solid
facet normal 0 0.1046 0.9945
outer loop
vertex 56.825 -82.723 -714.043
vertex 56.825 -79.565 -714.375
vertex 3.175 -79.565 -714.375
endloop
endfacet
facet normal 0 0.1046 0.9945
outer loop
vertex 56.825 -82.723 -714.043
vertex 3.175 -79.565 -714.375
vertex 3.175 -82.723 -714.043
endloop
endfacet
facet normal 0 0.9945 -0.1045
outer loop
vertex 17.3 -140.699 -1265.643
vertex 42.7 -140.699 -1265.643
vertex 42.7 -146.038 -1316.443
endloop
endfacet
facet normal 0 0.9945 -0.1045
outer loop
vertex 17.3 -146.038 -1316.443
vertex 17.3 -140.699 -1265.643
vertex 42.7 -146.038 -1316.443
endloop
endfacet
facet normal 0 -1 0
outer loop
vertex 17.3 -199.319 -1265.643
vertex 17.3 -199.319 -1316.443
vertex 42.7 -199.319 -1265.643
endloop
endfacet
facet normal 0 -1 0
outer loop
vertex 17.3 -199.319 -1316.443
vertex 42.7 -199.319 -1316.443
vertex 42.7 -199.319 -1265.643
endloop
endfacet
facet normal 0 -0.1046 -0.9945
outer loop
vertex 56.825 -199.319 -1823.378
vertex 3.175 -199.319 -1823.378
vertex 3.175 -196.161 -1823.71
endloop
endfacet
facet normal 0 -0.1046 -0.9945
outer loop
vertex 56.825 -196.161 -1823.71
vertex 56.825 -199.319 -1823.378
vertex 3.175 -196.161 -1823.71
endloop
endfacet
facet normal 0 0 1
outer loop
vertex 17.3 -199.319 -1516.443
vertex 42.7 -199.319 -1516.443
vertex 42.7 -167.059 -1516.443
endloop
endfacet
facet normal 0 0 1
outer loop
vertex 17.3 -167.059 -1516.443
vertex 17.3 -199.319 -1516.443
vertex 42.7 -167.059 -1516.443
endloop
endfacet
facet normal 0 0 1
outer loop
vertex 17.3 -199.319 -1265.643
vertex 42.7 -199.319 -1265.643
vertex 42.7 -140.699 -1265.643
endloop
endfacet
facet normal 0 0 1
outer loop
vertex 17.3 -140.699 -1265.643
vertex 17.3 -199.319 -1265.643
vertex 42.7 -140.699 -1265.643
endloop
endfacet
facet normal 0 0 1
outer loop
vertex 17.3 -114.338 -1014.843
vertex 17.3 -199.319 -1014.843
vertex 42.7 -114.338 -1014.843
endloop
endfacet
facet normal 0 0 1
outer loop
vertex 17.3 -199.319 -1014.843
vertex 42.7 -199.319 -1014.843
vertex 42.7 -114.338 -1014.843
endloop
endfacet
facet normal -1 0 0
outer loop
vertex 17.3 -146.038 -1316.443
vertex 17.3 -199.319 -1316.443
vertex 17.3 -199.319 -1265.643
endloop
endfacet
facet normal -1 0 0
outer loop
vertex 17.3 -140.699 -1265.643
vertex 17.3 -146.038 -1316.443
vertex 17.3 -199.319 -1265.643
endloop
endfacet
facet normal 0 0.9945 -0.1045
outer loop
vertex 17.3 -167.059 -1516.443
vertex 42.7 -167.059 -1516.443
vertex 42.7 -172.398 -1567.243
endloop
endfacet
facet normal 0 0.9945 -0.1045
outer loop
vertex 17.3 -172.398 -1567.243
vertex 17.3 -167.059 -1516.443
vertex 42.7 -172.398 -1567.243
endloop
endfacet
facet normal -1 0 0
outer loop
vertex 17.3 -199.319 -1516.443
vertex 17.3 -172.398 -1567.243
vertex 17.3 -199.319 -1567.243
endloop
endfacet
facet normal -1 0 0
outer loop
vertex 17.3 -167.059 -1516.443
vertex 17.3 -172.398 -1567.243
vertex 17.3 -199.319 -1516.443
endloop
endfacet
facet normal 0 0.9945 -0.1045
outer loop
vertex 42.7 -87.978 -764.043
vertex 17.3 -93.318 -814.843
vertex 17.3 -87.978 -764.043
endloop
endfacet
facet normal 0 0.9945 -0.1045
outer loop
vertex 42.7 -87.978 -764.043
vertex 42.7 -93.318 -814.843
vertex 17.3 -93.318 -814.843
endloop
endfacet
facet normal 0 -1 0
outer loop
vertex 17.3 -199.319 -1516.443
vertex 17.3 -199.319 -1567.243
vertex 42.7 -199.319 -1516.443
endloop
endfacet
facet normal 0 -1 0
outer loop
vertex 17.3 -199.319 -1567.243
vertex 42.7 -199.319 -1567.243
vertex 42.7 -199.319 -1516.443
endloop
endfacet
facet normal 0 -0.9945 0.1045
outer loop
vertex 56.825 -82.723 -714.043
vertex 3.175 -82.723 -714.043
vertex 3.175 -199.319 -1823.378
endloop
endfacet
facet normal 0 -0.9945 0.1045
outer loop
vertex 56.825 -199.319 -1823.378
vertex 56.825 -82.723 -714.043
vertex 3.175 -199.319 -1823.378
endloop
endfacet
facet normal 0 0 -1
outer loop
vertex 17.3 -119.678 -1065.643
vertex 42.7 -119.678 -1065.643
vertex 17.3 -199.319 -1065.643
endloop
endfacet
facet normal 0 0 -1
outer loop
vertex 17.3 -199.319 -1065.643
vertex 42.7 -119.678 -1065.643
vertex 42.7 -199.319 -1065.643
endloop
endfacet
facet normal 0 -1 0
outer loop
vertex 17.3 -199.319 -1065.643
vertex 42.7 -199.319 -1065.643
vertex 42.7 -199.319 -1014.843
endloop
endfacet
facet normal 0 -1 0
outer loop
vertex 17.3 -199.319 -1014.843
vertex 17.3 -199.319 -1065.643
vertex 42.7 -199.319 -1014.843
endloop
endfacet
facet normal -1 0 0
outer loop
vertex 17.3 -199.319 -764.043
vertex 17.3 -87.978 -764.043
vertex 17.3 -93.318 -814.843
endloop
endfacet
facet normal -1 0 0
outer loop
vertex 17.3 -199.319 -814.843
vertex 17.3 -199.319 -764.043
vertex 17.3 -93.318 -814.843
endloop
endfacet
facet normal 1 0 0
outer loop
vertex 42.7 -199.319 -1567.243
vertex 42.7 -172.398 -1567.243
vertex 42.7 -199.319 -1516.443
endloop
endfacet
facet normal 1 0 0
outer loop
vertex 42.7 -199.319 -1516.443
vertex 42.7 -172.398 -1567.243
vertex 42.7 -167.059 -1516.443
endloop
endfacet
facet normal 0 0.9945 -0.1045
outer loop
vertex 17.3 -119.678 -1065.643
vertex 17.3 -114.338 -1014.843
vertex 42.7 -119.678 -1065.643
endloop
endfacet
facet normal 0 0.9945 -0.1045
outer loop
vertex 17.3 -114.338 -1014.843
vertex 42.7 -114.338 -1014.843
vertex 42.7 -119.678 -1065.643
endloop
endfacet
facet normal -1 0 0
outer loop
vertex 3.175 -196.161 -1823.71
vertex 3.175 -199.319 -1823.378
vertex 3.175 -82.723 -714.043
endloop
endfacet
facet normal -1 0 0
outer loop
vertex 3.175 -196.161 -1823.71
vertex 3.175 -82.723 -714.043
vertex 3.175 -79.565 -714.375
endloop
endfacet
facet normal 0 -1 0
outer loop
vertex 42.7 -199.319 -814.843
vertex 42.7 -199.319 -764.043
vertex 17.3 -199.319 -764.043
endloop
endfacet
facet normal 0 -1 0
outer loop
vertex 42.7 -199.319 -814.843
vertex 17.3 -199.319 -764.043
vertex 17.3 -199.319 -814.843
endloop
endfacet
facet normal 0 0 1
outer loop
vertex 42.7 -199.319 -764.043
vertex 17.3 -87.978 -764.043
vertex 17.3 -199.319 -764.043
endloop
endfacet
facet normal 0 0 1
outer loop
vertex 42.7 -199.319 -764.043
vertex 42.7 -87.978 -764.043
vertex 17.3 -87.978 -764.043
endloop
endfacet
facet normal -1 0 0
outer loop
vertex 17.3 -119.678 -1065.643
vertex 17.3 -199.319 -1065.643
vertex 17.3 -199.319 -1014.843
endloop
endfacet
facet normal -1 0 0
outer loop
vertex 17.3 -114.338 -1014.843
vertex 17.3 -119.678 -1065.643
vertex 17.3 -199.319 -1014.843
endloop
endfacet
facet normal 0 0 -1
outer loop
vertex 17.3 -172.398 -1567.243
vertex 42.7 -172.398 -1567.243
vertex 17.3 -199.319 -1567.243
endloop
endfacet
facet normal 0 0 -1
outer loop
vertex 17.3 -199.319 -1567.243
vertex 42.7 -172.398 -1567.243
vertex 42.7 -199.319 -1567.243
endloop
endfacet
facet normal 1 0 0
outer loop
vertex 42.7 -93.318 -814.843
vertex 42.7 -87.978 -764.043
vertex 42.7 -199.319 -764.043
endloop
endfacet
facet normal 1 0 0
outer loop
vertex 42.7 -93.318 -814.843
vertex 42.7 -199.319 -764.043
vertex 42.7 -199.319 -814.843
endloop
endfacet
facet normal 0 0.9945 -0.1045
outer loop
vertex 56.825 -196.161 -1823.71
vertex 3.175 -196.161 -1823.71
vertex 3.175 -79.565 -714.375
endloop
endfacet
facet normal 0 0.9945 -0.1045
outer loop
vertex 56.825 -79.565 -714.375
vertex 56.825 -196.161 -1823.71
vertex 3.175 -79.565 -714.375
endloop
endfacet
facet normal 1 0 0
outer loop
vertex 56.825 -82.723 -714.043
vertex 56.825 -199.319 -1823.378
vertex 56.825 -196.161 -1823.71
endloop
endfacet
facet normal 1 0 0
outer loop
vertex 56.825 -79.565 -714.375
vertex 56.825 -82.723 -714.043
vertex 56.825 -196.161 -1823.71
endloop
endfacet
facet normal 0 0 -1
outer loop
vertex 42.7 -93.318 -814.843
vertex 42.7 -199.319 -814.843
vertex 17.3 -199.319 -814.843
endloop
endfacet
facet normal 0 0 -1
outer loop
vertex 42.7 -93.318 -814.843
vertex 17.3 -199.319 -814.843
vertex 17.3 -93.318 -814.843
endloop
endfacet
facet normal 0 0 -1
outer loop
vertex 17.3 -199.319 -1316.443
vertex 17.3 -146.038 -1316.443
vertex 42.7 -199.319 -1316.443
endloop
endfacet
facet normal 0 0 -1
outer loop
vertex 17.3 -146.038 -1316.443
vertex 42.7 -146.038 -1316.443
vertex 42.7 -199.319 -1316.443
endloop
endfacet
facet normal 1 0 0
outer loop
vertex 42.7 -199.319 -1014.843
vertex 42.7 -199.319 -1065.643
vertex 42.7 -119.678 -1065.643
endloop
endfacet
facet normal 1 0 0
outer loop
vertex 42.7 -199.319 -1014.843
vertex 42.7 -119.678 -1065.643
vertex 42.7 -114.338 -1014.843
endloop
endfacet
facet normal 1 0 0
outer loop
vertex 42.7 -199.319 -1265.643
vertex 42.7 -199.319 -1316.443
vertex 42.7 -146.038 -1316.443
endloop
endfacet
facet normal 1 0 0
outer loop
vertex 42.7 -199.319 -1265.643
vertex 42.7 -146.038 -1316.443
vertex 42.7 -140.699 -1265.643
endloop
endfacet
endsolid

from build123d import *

# Parameters (mm, degrees)
SLOPE_THICKEN1_START  = 3.175
SLOPE_THICKEN1_DEPTH  = 53.65
BOSS_EXTRUDE1_DEPTH   = 12.7
BOSS_EXTRUDE1_2_DEPTH = 12.7
BOSS_EXTRUDE1_3_DEPTH = 12.7
BOSS_EXTRUDE1_4_DEPTH = 12.7


# Read off the part's stored shape, not the designer's step: <Slope>-<Thicken1>
with BuildPart() as part:
    # <Slope>-<Thicken1> outline → <Slope>-<Thicken1> (new body)
    with BuildSketch(Plane.YZ.offset(SLOPE_THICKEN1_START)):
        Polygon((-199.318851276, -1823.377908094), (-196.161244258, -1823.709785964), (-79.565459926, -714.375), (-82.723066944, -714.043122129), align=None)
    extrude(amount=SLOPE_THICKEN1_DEPTH)


with BuildPart() as body_2:
    # Sketch2 → Boss-Extrude1 (new, symmetric)
    with BuildSketch(Plane(origin=(30, 0, 0), x_dir=(0, 0, -1), z_dir=(1, 0, 0))):
        Polygon((764.043122129, -87.978278707), (764.043122129, -199.318851276), (814.843122129, -199.318851276), (814.843122129, -93.317573858), align=None)
    extrude(amount=BOSS_EXTRUDE1_DEPTH, both=True)


with BuildPart() as body_3:
    # Sketch2 → Boss-Extrude1 2 (new, symmetric)
    with BuildSketch(Plane(origin=(30, 0, 0), x_dir=(0, 0, -1), z_dir=(1, 0, 0))):
        Polygon((1065.643122129, -199.318851276), (1014.843122129, -199.318851276), (1014.843122129, -114.338420912), (1065.643122129, -119.677716063), align=None)
    extrude(amount=BOSS_EXTRUDE1_2_DEPTH, both=True)


with BuildPart() as body_4:
    # Sketch2 → Boss-Extrude1 3 (new, symmetric)
    with BuildSketch(Plane(origin=(30, 0, 0), x_dir=(0, 0, -1), z_dir=(1, 0, 0))):
        Polygon((1265.643122129, -140.698563116), (1316.443122129, -146.037858268), (1316.443122129, -199.318851276), (1265.643122129, -199.318851276), align=None)
    extrude(amount=BOSS_EXTRUDE1_3_DEPTH, both=True)


with BuildPart() as body_5:
    # Sketch2 → Boss-Extrude1 4 (new, symmetric)
    with BuildSketch(Plane(origin=(30, 0, 0), x_dir=(0, 0, -1), z_dir=(1, 0, 0))):
        Polygon((1516.443122129, -167.058705321), (1567.243122129, -172.398000472), (1567.243122129, -199.318851276), (1516.443122129, -199.318851276), align=None)
    extrude(amount=BOSS_EXTRUDE1_4_DEPTH, both=True)


solid = Compound([part.part, body_2.part, body_3.part, body_4.part, body_5.part])
